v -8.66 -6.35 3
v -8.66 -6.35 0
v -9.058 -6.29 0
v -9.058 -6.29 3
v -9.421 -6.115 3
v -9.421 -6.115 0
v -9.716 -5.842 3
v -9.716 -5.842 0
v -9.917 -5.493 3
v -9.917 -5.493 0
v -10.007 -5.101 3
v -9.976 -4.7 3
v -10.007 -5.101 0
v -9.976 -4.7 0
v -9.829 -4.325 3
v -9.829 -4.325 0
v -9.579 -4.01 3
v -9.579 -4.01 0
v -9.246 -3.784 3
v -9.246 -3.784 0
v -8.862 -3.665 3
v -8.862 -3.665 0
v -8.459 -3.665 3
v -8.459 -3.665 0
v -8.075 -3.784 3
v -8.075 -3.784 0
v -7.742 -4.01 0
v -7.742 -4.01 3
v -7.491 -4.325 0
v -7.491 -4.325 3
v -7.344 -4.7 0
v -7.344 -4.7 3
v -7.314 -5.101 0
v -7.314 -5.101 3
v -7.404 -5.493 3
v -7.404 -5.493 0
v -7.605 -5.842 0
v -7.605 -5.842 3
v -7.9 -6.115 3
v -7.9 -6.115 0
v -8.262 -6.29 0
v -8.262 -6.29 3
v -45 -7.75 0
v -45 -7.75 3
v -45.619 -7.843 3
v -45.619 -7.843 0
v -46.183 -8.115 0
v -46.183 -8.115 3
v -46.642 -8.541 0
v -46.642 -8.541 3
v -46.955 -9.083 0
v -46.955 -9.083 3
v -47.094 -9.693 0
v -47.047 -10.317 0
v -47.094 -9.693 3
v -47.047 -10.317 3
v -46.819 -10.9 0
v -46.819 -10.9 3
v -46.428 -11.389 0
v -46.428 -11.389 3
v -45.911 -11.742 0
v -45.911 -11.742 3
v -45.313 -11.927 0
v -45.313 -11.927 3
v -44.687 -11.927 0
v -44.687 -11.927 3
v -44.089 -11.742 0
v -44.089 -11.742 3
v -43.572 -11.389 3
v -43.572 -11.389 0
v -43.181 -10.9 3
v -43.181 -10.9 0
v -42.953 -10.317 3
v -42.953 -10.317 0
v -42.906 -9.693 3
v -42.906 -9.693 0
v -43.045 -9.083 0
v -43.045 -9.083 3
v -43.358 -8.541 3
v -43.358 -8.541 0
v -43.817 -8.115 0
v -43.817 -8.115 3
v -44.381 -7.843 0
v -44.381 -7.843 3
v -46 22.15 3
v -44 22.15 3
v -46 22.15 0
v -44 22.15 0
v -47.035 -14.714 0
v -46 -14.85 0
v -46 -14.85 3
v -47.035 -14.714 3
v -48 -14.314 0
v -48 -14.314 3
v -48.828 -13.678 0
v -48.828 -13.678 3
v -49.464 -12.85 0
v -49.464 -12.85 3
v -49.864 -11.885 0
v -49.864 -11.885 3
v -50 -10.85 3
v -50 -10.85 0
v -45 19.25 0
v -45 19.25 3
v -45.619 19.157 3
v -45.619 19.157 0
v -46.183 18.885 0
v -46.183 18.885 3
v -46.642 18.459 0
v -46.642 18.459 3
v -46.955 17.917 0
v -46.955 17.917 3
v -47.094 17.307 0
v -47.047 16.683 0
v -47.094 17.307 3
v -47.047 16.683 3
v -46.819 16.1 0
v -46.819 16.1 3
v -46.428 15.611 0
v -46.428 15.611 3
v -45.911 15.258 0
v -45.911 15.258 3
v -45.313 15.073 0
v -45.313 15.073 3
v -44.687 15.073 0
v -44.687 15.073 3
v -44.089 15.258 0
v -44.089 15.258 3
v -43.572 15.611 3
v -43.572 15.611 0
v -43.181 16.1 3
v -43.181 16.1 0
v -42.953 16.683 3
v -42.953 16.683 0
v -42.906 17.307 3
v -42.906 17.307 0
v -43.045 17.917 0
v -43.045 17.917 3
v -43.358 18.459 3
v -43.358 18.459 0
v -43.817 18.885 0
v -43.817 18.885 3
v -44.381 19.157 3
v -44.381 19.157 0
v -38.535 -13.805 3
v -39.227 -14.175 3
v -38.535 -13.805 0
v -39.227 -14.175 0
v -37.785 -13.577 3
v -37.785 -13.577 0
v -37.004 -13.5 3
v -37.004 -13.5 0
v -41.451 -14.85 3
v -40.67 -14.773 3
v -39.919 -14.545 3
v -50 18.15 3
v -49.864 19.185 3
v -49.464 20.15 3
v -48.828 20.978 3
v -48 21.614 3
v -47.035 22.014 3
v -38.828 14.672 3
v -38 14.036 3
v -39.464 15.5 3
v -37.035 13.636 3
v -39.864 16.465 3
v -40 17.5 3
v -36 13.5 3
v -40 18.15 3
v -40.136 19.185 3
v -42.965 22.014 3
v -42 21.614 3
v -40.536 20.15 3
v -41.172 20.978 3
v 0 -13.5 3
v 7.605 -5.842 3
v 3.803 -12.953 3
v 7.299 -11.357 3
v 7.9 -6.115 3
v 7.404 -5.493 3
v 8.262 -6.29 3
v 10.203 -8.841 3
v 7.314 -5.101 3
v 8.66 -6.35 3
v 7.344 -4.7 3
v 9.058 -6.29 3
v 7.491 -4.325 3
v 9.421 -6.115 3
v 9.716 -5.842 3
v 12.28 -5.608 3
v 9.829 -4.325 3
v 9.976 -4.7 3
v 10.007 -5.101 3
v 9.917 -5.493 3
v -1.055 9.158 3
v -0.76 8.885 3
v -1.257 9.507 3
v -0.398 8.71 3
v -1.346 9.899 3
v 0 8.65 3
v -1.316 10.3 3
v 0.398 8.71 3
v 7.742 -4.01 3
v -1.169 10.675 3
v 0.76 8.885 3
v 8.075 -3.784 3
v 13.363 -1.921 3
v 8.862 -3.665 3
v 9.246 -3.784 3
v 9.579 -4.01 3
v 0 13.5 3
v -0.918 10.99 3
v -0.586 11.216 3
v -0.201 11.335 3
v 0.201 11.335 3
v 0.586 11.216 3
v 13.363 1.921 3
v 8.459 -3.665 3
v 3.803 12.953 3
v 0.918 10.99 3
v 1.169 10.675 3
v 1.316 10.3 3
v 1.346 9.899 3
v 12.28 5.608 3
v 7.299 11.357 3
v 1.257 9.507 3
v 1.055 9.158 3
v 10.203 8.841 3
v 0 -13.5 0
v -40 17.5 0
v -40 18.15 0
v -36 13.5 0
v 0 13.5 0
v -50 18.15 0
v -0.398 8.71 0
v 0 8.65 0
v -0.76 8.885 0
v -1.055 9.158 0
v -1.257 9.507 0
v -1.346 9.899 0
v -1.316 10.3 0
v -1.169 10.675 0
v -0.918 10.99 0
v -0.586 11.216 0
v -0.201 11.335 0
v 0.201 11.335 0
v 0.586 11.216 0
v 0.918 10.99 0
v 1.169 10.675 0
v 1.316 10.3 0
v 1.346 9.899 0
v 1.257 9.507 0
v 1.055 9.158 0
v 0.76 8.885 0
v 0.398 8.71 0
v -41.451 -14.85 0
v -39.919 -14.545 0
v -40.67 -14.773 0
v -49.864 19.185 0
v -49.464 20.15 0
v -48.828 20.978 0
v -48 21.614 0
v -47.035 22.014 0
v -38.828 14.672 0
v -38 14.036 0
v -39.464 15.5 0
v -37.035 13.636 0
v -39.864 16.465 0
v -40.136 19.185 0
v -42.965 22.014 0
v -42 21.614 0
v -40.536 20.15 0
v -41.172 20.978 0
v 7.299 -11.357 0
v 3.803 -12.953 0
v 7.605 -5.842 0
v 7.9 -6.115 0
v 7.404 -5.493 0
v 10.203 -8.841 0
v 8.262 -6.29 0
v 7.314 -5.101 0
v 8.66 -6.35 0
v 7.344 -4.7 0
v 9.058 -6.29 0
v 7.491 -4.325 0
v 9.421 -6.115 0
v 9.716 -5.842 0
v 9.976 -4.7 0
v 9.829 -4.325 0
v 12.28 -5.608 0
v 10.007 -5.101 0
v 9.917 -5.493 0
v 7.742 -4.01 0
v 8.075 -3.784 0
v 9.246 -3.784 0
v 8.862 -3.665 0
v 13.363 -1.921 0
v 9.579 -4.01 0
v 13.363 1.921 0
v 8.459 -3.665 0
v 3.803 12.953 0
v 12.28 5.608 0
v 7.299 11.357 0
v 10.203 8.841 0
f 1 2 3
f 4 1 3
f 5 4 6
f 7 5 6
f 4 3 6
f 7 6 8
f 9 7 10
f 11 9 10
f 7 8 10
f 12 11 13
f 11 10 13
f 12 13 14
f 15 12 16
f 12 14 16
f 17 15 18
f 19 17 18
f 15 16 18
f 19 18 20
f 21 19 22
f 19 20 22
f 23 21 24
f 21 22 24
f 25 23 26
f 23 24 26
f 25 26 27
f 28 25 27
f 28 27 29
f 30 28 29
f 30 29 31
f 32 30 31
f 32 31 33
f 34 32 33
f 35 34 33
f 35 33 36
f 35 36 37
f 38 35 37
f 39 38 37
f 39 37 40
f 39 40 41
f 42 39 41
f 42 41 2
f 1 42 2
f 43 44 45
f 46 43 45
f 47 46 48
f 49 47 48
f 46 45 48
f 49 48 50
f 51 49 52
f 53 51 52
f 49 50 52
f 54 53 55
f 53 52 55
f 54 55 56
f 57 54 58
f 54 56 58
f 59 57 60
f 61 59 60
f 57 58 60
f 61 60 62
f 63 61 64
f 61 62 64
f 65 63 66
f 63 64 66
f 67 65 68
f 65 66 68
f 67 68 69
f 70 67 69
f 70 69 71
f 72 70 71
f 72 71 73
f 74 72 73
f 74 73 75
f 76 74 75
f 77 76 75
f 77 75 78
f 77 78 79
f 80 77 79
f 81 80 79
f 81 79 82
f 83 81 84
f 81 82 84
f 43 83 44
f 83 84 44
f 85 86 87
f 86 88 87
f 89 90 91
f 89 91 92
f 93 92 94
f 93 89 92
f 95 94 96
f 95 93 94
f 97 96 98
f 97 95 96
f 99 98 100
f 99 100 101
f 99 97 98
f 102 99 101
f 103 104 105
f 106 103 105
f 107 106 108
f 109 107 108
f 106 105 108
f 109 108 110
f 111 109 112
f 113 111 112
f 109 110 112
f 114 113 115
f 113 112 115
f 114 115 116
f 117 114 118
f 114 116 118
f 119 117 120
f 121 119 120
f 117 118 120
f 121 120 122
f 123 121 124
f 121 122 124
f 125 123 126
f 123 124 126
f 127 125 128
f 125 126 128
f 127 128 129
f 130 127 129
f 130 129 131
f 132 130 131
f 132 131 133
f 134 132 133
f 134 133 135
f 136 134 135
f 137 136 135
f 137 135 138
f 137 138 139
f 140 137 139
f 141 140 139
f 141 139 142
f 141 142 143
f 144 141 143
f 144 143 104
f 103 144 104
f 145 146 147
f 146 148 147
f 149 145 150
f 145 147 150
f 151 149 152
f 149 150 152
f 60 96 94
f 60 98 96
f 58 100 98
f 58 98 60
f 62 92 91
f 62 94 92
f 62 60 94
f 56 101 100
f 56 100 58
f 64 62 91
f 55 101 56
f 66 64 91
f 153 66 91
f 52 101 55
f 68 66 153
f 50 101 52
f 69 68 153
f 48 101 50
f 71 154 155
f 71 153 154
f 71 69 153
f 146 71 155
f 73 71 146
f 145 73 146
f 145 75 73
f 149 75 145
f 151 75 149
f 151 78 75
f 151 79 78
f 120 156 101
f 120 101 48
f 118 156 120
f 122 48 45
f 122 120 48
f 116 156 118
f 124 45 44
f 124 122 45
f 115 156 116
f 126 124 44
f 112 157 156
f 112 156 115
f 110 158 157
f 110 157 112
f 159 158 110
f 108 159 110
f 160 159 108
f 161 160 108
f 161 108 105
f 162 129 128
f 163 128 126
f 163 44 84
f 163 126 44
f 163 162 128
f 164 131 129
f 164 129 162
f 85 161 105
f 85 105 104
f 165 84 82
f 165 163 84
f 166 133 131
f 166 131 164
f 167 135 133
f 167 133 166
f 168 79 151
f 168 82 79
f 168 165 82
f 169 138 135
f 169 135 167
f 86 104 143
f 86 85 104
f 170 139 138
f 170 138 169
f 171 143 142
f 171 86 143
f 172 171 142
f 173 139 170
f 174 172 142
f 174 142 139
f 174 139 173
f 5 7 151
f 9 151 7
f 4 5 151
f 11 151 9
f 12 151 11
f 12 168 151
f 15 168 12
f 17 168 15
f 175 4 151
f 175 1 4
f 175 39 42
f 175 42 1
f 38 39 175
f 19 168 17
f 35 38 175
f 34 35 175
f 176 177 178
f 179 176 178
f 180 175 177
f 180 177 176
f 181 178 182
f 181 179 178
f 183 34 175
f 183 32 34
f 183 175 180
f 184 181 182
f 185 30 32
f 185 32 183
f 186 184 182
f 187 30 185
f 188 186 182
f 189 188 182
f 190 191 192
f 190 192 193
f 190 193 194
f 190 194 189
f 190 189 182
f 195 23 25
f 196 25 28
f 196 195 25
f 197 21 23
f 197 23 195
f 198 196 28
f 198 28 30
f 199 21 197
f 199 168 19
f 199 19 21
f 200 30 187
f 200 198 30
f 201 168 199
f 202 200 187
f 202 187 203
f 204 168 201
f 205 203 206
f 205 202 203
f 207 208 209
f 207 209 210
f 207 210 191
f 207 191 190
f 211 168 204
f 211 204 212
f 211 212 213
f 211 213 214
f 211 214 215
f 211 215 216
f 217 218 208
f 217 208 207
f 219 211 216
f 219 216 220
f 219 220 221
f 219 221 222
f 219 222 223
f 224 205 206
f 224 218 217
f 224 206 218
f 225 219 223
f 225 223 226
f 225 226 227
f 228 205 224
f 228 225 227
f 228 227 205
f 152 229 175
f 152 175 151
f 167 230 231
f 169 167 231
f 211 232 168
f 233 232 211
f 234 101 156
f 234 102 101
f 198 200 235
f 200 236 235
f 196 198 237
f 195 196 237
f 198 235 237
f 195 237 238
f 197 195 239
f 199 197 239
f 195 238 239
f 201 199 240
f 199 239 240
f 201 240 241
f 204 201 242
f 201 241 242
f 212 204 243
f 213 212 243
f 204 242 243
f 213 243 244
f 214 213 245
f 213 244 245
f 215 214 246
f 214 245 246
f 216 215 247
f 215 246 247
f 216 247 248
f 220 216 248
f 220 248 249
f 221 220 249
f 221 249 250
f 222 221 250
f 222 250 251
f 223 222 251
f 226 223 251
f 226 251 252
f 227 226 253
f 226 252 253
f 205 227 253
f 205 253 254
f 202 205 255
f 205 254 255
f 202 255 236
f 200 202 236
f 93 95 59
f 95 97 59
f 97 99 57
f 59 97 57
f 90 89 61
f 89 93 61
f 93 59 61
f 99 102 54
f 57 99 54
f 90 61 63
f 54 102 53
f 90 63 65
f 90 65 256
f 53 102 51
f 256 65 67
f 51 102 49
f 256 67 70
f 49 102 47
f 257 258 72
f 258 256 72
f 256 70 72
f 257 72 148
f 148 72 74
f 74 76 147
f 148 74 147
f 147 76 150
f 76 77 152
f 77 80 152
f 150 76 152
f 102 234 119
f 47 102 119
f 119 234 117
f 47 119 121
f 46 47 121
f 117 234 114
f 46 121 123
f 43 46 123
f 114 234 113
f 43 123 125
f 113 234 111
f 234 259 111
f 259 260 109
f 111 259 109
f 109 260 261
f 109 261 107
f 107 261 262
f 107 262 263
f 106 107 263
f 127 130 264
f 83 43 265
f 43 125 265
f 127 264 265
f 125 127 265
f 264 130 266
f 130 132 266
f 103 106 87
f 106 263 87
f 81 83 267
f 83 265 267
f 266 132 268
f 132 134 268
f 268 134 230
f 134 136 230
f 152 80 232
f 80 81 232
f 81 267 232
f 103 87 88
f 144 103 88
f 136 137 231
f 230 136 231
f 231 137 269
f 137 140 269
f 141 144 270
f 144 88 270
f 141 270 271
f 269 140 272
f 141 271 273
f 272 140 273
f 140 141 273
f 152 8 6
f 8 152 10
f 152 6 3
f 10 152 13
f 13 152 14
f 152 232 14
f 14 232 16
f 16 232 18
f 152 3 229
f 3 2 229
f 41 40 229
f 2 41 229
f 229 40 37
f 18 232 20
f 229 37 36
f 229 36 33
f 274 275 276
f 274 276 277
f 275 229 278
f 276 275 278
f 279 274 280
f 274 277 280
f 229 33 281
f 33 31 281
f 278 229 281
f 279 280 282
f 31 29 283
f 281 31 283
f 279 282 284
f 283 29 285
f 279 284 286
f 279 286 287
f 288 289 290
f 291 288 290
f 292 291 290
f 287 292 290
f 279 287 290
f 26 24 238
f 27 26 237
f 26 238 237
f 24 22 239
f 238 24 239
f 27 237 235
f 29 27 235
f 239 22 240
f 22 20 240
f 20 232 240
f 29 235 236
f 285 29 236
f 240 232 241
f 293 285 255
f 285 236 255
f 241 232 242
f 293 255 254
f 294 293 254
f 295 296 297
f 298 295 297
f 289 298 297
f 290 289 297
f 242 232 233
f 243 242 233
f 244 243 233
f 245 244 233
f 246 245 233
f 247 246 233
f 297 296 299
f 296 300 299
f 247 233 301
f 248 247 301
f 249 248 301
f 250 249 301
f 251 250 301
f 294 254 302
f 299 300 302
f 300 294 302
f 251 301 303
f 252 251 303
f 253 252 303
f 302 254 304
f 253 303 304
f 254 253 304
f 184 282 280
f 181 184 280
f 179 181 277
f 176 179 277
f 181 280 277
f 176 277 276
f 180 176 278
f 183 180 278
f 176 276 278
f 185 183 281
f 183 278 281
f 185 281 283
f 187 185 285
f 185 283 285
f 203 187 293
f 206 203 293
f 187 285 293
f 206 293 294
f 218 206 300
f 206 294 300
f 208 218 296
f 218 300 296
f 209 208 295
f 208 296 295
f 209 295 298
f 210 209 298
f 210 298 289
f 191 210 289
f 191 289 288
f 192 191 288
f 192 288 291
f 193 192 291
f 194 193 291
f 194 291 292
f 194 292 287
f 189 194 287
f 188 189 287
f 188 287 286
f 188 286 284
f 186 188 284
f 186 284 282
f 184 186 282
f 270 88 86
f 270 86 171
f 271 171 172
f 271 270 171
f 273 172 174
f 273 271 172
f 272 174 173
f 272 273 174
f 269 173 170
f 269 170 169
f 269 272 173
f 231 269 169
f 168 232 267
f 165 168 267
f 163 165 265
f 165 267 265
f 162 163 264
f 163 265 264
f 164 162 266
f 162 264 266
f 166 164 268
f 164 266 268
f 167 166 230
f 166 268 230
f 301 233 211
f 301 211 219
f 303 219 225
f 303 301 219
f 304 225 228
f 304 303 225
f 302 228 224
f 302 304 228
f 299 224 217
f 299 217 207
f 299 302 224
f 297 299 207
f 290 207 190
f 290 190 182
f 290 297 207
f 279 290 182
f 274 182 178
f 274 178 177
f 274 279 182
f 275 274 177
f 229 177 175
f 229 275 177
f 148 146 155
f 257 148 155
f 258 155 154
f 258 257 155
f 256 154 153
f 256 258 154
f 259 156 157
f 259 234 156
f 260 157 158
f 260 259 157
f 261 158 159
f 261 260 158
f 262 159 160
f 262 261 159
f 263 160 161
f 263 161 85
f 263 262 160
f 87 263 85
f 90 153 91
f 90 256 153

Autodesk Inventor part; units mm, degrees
ref_plane "YZ Plane" through (0, 0, 0) normal (1, 0, 0) x (0, 1, 0)
ref_plane "XZ Plane" through (0, 0, 0) normal (0, 1, 0) x (-1, 0, 0)
ref_plane "XY Plane" through (0, 0, 0) normal (0, 0, 1) x (1, 0, 0)
sketch "スケッチ1" plane through (0, 0, 0) normal (0, 0, 1) x (1, 0, 0)
  circle A0 centre (0, 0) radius 13.5
  dimension "d0" = 27
extrude "押し出し1" add sketch "スケッチ1" along normal blind 3
sketch "スケッチ2" plane through (0, 0, 3) normal (0, 0, 1) x (1, 0, 0)
  point P0 (0, 0)
  point P1 (0, 10)
  point P2 (-8.6603, -5)
  point P3 (8.6603, -5)
  dimension "d3" = 10
  dimension "d6" = 360
hole "穴1" at (0, 10, 3) at (-8.6603, -5, 3) at (8.6603, -5, 3) direction (0, 0, -1) diameter 2.7 depth 3
sketch "スケッチ3" plane through (0, 0, 0) normal (0, 0, -1) x (-1, 0, 0)
  circle A0 centre (0, 0) radius 13.5 projected
  line L0 (0, -13.5) -> (50, -13.5)
  line L1 (50, -13.5) -> (50, 13.5)
  line L2 (50, 13.5) -> (0, 13.5)
  line L3 (0, 13.5) -> (0, -13.5)
  line L4 (0, 0) -> (50, 0) construction
  line L5 (50, 13.5) -> (40, 13.5)
  line L6 (40, 13.5) -> (40, 22.15)
  line L7 (40, 22.15) -> (50, 22.15)
  line L8 (50, 22.15) -> (50, 13.5)
  line L9 (50, -13.5) -> (40, -13.5)
  line L10 (40, -13.5) -> (40, -14.85)
  line L11 (40, -14.85) -> (50, -14.85)
  line L12 (50, -14.85) -> (50, -13.5)
  point P0 (40, -13.5)
  dimension "d15" = 27
  dimension "d16" = 50
  dimension "d18" = 10
  dimension "d32" = 10
  dimension "d33" = 1.35
  dimension "d34" = 37
extrude "押し出し2" add sketch "スケッチ3" against normal up to surface (3 mm away) contours A0 L2 L1 L0 | L6 L7 L8 L2 | L0 L12 L11 L10
sketch "スケッチ4" plane through (0, 0, 0) normal (0, 0, -1) x (-1, 0, 0)
  line L0 (0, -13.5) -> (40, -13.5) projected
  line L1 (45, -13.5) -> (45, 22.15) construction
  line L2 (50, 22.15) -> (40, 22.15) projected
  line L3 (40, -14.85) -> (50, -14.85) projected
  line L4 (50, -14.85) -> (50, 22.15) projected
  point P0 (0, 0)
  point P1 (45, -9.85)
  point P2 (45, 17.15)
  dimension "d23" = 27
  dimension "d35" = 5
  dimension "d37" = 5
hole "穴2" at (-45, -9.85, 0) at (-45, 17.15, 0) direction (0, 0, 1) diameter 4.2 depth 3
fillet "フィレット1" radius 4 6 edges at (-40, 13.5, 1.5) (-40, 22.15, 1.5) (-50, 22.15, 1.5) (-50, -14.85, 1.5) (-40, -14.85, 1.5) (-40, -13.5, 1.5)
properties part number "finger2" material "アルミニウム 6061"
